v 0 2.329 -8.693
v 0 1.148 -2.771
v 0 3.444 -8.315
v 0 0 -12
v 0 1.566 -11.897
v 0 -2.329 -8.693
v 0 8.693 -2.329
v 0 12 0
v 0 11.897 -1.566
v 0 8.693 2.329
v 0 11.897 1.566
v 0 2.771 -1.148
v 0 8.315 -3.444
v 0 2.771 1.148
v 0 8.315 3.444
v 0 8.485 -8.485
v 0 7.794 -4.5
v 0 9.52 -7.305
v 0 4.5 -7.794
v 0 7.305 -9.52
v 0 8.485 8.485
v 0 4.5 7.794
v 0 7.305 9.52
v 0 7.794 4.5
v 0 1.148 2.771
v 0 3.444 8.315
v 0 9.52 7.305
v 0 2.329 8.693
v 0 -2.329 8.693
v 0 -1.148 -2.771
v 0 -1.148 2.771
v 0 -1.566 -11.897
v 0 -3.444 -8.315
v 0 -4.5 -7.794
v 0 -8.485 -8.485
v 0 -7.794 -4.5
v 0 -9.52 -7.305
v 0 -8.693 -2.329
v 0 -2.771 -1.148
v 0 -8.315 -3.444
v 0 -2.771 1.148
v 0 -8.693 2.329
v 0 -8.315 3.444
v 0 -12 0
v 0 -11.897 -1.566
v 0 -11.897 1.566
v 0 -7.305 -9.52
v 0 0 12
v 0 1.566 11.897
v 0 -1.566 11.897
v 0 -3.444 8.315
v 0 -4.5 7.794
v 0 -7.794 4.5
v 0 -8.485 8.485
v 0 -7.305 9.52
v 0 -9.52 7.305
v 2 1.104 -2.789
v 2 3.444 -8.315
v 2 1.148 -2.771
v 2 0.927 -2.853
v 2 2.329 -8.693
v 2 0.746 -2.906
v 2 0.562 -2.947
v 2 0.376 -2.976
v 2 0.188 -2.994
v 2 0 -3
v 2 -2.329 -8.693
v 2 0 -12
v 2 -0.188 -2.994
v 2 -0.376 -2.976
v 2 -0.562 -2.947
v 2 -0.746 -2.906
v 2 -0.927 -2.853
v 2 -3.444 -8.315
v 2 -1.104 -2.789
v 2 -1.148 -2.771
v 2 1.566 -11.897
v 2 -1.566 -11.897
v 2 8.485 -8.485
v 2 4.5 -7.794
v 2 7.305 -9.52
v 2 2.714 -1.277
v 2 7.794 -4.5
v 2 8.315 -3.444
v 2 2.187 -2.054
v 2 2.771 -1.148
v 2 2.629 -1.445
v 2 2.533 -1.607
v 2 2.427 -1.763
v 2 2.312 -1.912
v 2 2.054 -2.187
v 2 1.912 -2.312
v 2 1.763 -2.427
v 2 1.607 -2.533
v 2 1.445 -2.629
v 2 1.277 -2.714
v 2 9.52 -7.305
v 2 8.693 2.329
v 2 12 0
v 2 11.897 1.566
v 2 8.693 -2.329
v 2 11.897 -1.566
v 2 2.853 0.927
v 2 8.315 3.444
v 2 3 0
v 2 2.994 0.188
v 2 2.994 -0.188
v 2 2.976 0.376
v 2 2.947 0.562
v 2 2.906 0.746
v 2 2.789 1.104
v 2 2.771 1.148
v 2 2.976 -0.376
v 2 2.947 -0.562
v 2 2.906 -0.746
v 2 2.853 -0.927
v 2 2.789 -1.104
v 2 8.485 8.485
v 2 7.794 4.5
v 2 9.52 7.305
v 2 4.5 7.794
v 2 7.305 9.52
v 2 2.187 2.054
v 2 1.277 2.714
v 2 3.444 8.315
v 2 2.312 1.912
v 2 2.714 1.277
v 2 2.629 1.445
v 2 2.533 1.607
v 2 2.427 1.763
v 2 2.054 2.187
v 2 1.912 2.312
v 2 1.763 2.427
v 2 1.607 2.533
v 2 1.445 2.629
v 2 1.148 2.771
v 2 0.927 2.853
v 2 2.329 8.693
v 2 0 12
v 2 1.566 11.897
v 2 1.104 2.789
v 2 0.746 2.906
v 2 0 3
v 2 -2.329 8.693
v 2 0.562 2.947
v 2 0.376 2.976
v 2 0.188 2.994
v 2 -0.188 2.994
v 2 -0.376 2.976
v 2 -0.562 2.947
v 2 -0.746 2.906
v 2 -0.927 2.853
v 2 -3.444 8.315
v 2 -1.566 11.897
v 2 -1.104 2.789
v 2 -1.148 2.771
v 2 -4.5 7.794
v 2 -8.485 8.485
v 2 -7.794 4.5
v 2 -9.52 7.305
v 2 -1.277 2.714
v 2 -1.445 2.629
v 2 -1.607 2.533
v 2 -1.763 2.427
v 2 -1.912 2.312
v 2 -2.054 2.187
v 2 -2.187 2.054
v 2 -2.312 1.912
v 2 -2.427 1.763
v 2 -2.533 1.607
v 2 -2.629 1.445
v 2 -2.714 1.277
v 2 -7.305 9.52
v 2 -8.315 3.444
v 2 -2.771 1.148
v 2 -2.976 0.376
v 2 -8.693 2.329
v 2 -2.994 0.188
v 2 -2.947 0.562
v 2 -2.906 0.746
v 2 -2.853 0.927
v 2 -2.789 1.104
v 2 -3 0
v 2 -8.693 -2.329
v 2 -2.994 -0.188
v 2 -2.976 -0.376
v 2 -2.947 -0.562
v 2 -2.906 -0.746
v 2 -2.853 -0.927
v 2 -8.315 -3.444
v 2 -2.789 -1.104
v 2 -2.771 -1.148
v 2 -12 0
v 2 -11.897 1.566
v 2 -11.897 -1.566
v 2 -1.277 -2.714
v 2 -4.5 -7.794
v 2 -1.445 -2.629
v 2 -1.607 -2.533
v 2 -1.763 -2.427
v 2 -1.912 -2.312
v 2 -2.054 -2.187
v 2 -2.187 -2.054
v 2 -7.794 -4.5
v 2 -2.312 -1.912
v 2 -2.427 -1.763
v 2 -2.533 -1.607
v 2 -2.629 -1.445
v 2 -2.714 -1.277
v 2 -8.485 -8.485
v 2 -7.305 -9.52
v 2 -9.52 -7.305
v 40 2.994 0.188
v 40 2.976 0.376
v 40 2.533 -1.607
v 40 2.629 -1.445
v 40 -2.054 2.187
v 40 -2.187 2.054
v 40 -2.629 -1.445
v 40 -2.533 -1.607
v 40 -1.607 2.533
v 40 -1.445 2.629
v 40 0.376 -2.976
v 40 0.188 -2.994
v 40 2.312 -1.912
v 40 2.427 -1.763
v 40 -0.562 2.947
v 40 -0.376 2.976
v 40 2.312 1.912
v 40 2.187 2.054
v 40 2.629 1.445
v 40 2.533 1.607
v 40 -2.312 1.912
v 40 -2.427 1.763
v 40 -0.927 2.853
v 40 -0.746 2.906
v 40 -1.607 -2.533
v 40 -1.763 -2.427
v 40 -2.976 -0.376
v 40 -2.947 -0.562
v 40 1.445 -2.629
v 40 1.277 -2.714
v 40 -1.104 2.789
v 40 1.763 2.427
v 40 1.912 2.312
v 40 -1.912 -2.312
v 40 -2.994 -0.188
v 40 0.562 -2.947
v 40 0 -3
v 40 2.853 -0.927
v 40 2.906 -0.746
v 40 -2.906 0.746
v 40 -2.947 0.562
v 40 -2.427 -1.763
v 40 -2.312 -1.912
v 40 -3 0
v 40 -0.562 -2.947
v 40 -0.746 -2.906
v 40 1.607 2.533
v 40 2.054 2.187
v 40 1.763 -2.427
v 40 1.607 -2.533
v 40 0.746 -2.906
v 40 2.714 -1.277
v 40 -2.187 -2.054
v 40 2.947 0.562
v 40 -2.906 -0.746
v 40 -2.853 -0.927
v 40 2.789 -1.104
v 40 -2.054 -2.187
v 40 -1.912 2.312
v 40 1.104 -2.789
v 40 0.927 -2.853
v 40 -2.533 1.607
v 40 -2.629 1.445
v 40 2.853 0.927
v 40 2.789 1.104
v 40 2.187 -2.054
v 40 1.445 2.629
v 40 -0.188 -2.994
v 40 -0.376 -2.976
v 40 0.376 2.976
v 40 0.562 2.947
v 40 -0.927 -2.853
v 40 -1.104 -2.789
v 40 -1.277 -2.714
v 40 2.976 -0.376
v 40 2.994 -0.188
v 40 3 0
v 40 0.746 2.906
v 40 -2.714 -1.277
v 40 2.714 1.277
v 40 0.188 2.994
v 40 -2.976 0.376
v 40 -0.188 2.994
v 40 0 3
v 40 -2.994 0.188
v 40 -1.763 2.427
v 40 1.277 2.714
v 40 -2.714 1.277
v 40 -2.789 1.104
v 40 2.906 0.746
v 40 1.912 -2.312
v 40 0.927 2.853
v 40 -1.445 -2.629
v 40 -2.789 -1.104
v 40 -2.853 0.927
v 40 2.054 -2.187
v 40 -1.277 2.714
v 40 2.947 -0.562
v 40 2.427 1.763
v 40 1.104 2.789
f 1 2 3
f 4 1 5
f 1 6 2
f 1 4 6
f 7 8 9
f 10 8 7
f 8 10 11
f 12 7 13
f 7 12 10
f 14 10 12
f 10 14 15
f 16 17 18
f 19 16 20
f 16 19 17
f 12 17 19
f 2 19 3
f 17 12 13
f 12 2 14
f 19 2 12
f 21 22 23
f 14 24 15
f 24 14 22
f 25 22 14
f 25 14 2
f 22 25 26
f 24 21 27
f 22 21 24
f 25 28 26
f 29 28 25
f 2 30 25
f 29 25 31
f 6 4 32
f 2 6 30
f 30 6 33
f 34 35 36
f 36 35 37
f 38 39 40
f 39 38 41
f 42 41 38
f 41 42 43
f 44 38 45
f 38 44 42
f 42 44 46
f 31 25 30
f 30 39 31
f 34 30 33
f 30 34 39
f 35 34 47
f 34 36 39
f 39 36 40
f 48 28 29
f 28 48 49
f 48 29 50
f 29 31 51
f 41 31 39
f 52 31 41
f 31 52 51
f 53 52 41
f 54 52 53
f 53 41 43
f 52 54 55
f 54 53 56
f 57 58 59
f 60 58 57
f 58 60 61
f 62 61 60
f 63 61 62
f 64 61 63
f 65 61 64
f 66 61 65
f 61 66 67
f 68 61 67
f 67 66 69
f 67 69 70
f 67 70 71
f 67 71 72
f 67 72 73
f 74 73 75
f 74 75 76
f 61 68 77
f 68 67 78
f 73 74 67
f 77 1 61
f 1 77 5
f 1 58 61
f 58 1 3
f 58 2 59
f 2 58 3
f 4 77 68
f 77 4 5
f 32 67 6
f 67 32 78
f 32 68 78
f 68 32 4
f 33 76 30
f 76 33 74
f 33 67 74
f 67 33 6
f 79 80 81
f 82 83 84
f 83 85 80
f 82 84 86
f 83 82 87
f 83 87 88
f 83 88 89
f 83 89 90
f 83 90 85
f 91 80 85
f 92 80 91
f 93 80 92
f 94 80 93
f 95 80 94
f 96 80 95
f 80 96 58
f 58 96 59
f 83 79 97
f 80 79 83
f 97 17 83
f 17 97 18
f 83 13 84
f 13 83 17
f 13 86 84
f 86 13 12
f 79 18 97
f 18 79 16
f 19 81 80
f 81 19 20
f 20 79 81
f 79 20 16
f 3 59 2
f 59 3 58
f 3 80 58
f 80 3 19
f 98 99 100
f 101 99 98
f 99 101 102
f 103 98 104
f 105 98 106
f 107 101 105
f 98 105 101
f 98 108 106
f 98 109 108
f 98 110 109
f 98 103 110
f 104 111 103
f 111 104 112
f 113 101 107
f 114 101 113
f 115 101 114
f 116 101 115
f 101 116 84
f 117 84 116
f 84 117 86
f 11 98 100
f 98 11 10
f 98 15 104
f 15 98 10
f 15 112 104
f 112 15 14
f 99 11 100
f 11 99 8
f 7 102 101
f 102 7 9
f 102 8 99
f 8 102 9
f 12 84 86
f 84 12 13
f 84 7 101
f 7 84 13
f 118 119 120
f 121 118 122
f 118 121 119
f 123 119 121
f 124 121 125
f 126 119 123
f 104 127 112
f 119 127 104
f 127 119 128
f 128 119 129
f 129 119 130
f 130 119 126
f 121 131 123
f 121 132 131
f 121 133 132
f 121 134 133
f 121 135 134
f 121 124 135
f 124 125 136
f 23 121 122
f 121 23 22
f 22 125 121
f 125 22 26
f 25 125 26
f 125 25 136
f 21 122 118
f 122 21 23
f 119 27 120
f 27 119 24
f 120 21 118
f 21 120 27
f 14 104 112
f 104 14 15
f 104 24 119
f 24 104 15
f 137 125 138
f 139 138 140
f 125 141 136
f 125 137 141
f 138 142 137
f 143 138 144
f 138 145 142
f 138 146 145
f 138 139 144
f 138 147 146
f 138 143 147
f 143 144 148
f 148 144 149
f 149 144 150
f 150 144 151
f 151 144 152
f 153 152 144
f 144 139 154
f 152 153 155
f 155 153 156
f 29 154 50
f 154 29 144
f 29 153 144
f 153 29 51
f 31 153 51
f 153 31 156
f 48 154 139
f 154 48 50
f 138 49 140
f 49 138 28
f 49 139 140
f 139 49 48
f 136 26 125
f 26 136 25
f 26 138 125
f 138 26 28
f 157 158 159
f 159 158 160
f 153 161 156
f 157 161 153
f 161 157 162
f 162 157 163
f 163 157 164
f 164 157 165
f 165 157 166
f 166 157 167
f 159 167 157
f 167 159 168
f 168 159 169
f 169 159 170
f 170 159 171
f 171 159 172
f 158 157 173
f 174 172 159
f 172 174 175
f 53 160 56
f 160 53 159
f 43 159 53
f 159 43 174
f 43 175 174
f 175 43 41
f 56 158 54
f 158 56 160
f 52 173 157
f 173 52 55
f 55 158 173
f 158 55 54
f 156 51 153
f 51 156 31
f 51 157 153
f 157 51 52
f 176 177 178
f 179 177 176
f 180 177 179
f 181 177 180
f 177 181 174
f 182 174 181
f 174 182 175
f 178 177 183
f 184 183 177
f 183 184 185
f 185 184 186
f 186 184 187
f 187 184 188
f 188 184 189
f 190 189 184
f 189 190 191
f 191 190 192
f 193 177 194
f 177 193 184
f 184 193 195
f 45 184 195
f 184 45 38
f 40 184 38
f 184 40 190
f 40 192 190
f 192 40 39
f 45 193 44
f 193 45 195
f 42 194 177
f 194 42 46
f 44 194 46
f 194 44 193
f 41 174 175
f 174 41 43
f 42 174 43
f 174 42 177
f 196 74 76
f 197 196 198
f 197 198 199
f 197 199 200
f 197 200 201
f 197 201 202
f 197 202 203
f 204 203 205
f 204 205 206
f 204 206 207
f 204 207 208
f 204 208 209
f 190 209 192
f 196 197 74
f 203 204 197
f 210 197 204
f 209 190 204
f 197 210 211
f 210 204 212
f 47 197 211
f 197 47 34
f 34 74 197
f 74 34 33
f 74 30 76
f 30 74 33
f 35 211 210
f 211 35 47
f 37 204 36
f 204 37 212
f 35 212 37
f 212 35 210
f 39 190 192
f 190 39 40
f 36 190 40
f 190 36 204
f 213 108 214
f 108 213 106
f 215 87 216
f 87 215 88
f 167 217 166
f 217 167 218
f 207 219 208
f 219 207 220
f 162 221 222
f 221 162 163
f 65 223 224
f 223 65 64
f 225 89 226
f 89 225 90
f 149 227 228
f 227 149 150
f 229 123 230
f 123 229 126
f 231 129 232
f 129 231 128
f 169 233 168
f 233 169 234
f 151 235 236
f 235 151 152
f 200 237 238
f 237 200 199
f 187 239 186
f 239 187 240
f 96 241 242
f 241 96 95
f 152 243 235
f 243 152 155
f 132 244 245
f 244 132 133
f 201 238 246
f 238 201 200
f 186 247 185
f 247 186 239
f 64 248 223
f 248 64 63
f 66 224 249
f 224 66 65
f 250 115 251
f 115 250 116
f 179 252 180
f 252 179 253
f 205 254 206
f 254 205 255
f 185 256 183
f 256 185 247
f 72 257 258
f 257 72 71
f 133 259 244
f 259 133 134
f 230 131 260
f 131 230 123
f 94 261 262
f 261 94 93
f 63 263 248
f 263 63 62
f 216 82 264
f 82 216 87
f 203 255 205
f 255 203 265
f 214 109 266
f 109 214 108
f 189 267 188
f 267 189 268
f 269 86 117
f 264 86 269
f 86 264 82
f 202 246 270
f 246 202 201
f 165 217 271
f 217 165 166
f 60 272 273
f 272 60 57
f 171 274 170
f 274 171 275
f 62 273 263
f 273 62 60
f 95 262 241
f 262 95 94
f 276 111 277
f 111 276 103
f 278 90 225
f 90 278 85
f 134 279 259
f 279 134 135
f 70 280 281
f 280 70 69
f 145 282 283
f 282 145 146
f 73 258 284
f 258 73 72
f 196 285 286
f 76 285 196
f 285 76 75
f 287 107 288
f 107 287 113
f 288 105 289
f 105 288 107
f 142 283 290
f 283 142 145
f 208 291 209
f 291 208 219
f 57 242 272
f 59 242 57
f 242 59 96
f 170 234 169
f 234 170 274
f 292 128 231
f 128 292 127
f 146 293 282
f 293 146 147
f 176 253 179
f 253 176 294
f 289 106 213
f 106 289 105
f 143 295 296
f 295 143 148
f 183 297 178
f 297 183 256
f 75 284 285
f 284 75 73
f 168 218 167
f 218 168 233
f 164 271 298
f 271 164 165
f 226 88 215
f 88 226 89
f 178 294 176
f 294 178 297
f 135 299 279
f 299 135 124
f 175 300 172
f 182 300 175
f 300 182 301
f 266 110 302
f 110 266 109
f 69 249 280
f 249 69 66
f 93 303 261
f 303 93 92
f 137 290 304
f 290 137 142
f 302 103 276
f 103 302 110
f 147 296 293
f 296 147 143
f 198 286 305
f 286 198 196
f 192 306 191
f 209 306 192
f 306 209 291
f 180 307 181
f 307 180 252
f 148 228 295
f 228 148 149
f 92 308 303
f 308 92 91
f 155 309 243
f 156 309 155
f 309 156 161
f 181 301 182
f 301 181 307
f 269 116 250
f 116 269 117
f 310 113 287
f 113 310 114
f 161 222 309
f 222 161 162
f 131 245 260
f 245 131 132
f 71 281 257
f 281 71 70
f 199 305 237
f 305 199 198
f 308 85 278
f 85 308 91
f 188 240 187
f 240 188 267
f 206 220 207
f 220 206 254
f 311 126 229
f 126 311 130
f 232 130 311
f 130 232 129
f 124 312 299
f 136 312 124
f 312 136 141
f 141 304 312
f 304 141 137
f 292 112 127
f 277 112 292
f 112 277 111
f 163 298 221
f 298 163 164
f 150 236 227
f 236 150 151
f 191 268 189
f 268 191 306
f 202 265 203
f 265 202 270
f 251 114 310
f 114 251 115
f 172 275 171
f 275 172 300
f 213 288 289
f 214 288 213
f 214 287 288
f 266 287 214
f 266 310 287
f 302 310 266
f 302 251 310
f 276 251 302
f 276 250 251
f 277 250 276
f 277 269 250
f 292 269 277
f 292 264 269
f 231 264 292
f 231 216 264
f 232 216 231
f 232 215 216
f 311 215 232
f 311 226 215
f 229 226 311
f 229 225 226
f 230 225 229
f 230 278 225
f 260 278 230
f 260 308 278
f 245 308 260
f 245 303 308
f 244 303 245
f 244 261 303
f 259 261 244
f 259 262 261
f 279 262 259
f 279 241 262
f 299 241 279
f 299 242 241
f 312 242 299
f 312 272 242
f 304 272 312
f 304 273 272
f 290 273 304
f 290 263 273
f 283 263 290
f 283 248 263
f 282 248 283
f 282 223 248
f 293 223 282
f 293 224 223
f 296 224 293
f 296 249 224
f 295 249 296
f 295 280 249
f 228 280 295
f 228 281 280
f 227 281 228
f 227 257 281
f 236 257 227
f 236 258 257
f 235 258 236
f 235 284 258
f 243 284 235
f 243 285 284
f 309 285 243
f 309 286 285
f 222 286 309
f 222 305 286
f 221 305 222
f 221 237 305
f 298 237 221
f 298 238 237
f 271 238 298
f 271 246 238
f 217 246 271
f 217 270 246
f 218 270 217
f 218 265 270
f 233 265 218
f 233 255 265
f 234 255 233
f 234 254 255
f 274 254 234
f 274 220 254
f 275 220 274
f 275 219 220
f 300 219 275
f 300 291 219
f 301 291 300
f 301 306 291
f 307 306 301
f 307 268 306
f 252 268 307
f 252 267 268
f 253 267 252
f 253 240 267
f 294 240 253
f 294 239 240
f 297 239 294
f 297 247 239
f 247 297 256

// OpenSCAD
// file: utils.scad
module gear(n, r, h, l) {
    tooth_angle = 360 / n / 2;
    
    
    for (i = [0: n]) {
        rotate([0, 0, tooth_angle * i * 2])
        union() {
            linear_extrude(l)
            polygon([
                [0, 0],
                [r, 0],
                [r * cos(tooth_angle / 3), r * sin(tooth_angle / 3)],
                [(r-h) * cos(2 * tooth_angle / 3), (r-h) * sin(2 * tooth_angle / 3)],
                [(r-h) * cos(tooth_angle), (r-h) * sin(tooth_angle)]
            ]);
            
            linear_extrude(l)
            rotate([180, 0, 0])
            polygon([
                [0, 0],
                [r, 0],
                [r * cos(tooth_angle / 3), r * sin(tooth_angle / 3)],
                [(r-h) * cos(2 * tooth_angle / 3), (r-h) * sin(2 * tooth_angle / 3)],
                [(r-h) * cos(tooth_angle), (r-h) * sin(tooth_angle)]
            ]);
        }
    }
}

gear(8, 10, 3, 2);
// main file
use <utils.scad>

$fn = 100;

module transmission_assembled() {
    rotate([0, 90, 0])
    union() {
        cylinder(40, 3, 3);
        gear(8, 12, 3, 2);
    }
}

transmission_assembled();
